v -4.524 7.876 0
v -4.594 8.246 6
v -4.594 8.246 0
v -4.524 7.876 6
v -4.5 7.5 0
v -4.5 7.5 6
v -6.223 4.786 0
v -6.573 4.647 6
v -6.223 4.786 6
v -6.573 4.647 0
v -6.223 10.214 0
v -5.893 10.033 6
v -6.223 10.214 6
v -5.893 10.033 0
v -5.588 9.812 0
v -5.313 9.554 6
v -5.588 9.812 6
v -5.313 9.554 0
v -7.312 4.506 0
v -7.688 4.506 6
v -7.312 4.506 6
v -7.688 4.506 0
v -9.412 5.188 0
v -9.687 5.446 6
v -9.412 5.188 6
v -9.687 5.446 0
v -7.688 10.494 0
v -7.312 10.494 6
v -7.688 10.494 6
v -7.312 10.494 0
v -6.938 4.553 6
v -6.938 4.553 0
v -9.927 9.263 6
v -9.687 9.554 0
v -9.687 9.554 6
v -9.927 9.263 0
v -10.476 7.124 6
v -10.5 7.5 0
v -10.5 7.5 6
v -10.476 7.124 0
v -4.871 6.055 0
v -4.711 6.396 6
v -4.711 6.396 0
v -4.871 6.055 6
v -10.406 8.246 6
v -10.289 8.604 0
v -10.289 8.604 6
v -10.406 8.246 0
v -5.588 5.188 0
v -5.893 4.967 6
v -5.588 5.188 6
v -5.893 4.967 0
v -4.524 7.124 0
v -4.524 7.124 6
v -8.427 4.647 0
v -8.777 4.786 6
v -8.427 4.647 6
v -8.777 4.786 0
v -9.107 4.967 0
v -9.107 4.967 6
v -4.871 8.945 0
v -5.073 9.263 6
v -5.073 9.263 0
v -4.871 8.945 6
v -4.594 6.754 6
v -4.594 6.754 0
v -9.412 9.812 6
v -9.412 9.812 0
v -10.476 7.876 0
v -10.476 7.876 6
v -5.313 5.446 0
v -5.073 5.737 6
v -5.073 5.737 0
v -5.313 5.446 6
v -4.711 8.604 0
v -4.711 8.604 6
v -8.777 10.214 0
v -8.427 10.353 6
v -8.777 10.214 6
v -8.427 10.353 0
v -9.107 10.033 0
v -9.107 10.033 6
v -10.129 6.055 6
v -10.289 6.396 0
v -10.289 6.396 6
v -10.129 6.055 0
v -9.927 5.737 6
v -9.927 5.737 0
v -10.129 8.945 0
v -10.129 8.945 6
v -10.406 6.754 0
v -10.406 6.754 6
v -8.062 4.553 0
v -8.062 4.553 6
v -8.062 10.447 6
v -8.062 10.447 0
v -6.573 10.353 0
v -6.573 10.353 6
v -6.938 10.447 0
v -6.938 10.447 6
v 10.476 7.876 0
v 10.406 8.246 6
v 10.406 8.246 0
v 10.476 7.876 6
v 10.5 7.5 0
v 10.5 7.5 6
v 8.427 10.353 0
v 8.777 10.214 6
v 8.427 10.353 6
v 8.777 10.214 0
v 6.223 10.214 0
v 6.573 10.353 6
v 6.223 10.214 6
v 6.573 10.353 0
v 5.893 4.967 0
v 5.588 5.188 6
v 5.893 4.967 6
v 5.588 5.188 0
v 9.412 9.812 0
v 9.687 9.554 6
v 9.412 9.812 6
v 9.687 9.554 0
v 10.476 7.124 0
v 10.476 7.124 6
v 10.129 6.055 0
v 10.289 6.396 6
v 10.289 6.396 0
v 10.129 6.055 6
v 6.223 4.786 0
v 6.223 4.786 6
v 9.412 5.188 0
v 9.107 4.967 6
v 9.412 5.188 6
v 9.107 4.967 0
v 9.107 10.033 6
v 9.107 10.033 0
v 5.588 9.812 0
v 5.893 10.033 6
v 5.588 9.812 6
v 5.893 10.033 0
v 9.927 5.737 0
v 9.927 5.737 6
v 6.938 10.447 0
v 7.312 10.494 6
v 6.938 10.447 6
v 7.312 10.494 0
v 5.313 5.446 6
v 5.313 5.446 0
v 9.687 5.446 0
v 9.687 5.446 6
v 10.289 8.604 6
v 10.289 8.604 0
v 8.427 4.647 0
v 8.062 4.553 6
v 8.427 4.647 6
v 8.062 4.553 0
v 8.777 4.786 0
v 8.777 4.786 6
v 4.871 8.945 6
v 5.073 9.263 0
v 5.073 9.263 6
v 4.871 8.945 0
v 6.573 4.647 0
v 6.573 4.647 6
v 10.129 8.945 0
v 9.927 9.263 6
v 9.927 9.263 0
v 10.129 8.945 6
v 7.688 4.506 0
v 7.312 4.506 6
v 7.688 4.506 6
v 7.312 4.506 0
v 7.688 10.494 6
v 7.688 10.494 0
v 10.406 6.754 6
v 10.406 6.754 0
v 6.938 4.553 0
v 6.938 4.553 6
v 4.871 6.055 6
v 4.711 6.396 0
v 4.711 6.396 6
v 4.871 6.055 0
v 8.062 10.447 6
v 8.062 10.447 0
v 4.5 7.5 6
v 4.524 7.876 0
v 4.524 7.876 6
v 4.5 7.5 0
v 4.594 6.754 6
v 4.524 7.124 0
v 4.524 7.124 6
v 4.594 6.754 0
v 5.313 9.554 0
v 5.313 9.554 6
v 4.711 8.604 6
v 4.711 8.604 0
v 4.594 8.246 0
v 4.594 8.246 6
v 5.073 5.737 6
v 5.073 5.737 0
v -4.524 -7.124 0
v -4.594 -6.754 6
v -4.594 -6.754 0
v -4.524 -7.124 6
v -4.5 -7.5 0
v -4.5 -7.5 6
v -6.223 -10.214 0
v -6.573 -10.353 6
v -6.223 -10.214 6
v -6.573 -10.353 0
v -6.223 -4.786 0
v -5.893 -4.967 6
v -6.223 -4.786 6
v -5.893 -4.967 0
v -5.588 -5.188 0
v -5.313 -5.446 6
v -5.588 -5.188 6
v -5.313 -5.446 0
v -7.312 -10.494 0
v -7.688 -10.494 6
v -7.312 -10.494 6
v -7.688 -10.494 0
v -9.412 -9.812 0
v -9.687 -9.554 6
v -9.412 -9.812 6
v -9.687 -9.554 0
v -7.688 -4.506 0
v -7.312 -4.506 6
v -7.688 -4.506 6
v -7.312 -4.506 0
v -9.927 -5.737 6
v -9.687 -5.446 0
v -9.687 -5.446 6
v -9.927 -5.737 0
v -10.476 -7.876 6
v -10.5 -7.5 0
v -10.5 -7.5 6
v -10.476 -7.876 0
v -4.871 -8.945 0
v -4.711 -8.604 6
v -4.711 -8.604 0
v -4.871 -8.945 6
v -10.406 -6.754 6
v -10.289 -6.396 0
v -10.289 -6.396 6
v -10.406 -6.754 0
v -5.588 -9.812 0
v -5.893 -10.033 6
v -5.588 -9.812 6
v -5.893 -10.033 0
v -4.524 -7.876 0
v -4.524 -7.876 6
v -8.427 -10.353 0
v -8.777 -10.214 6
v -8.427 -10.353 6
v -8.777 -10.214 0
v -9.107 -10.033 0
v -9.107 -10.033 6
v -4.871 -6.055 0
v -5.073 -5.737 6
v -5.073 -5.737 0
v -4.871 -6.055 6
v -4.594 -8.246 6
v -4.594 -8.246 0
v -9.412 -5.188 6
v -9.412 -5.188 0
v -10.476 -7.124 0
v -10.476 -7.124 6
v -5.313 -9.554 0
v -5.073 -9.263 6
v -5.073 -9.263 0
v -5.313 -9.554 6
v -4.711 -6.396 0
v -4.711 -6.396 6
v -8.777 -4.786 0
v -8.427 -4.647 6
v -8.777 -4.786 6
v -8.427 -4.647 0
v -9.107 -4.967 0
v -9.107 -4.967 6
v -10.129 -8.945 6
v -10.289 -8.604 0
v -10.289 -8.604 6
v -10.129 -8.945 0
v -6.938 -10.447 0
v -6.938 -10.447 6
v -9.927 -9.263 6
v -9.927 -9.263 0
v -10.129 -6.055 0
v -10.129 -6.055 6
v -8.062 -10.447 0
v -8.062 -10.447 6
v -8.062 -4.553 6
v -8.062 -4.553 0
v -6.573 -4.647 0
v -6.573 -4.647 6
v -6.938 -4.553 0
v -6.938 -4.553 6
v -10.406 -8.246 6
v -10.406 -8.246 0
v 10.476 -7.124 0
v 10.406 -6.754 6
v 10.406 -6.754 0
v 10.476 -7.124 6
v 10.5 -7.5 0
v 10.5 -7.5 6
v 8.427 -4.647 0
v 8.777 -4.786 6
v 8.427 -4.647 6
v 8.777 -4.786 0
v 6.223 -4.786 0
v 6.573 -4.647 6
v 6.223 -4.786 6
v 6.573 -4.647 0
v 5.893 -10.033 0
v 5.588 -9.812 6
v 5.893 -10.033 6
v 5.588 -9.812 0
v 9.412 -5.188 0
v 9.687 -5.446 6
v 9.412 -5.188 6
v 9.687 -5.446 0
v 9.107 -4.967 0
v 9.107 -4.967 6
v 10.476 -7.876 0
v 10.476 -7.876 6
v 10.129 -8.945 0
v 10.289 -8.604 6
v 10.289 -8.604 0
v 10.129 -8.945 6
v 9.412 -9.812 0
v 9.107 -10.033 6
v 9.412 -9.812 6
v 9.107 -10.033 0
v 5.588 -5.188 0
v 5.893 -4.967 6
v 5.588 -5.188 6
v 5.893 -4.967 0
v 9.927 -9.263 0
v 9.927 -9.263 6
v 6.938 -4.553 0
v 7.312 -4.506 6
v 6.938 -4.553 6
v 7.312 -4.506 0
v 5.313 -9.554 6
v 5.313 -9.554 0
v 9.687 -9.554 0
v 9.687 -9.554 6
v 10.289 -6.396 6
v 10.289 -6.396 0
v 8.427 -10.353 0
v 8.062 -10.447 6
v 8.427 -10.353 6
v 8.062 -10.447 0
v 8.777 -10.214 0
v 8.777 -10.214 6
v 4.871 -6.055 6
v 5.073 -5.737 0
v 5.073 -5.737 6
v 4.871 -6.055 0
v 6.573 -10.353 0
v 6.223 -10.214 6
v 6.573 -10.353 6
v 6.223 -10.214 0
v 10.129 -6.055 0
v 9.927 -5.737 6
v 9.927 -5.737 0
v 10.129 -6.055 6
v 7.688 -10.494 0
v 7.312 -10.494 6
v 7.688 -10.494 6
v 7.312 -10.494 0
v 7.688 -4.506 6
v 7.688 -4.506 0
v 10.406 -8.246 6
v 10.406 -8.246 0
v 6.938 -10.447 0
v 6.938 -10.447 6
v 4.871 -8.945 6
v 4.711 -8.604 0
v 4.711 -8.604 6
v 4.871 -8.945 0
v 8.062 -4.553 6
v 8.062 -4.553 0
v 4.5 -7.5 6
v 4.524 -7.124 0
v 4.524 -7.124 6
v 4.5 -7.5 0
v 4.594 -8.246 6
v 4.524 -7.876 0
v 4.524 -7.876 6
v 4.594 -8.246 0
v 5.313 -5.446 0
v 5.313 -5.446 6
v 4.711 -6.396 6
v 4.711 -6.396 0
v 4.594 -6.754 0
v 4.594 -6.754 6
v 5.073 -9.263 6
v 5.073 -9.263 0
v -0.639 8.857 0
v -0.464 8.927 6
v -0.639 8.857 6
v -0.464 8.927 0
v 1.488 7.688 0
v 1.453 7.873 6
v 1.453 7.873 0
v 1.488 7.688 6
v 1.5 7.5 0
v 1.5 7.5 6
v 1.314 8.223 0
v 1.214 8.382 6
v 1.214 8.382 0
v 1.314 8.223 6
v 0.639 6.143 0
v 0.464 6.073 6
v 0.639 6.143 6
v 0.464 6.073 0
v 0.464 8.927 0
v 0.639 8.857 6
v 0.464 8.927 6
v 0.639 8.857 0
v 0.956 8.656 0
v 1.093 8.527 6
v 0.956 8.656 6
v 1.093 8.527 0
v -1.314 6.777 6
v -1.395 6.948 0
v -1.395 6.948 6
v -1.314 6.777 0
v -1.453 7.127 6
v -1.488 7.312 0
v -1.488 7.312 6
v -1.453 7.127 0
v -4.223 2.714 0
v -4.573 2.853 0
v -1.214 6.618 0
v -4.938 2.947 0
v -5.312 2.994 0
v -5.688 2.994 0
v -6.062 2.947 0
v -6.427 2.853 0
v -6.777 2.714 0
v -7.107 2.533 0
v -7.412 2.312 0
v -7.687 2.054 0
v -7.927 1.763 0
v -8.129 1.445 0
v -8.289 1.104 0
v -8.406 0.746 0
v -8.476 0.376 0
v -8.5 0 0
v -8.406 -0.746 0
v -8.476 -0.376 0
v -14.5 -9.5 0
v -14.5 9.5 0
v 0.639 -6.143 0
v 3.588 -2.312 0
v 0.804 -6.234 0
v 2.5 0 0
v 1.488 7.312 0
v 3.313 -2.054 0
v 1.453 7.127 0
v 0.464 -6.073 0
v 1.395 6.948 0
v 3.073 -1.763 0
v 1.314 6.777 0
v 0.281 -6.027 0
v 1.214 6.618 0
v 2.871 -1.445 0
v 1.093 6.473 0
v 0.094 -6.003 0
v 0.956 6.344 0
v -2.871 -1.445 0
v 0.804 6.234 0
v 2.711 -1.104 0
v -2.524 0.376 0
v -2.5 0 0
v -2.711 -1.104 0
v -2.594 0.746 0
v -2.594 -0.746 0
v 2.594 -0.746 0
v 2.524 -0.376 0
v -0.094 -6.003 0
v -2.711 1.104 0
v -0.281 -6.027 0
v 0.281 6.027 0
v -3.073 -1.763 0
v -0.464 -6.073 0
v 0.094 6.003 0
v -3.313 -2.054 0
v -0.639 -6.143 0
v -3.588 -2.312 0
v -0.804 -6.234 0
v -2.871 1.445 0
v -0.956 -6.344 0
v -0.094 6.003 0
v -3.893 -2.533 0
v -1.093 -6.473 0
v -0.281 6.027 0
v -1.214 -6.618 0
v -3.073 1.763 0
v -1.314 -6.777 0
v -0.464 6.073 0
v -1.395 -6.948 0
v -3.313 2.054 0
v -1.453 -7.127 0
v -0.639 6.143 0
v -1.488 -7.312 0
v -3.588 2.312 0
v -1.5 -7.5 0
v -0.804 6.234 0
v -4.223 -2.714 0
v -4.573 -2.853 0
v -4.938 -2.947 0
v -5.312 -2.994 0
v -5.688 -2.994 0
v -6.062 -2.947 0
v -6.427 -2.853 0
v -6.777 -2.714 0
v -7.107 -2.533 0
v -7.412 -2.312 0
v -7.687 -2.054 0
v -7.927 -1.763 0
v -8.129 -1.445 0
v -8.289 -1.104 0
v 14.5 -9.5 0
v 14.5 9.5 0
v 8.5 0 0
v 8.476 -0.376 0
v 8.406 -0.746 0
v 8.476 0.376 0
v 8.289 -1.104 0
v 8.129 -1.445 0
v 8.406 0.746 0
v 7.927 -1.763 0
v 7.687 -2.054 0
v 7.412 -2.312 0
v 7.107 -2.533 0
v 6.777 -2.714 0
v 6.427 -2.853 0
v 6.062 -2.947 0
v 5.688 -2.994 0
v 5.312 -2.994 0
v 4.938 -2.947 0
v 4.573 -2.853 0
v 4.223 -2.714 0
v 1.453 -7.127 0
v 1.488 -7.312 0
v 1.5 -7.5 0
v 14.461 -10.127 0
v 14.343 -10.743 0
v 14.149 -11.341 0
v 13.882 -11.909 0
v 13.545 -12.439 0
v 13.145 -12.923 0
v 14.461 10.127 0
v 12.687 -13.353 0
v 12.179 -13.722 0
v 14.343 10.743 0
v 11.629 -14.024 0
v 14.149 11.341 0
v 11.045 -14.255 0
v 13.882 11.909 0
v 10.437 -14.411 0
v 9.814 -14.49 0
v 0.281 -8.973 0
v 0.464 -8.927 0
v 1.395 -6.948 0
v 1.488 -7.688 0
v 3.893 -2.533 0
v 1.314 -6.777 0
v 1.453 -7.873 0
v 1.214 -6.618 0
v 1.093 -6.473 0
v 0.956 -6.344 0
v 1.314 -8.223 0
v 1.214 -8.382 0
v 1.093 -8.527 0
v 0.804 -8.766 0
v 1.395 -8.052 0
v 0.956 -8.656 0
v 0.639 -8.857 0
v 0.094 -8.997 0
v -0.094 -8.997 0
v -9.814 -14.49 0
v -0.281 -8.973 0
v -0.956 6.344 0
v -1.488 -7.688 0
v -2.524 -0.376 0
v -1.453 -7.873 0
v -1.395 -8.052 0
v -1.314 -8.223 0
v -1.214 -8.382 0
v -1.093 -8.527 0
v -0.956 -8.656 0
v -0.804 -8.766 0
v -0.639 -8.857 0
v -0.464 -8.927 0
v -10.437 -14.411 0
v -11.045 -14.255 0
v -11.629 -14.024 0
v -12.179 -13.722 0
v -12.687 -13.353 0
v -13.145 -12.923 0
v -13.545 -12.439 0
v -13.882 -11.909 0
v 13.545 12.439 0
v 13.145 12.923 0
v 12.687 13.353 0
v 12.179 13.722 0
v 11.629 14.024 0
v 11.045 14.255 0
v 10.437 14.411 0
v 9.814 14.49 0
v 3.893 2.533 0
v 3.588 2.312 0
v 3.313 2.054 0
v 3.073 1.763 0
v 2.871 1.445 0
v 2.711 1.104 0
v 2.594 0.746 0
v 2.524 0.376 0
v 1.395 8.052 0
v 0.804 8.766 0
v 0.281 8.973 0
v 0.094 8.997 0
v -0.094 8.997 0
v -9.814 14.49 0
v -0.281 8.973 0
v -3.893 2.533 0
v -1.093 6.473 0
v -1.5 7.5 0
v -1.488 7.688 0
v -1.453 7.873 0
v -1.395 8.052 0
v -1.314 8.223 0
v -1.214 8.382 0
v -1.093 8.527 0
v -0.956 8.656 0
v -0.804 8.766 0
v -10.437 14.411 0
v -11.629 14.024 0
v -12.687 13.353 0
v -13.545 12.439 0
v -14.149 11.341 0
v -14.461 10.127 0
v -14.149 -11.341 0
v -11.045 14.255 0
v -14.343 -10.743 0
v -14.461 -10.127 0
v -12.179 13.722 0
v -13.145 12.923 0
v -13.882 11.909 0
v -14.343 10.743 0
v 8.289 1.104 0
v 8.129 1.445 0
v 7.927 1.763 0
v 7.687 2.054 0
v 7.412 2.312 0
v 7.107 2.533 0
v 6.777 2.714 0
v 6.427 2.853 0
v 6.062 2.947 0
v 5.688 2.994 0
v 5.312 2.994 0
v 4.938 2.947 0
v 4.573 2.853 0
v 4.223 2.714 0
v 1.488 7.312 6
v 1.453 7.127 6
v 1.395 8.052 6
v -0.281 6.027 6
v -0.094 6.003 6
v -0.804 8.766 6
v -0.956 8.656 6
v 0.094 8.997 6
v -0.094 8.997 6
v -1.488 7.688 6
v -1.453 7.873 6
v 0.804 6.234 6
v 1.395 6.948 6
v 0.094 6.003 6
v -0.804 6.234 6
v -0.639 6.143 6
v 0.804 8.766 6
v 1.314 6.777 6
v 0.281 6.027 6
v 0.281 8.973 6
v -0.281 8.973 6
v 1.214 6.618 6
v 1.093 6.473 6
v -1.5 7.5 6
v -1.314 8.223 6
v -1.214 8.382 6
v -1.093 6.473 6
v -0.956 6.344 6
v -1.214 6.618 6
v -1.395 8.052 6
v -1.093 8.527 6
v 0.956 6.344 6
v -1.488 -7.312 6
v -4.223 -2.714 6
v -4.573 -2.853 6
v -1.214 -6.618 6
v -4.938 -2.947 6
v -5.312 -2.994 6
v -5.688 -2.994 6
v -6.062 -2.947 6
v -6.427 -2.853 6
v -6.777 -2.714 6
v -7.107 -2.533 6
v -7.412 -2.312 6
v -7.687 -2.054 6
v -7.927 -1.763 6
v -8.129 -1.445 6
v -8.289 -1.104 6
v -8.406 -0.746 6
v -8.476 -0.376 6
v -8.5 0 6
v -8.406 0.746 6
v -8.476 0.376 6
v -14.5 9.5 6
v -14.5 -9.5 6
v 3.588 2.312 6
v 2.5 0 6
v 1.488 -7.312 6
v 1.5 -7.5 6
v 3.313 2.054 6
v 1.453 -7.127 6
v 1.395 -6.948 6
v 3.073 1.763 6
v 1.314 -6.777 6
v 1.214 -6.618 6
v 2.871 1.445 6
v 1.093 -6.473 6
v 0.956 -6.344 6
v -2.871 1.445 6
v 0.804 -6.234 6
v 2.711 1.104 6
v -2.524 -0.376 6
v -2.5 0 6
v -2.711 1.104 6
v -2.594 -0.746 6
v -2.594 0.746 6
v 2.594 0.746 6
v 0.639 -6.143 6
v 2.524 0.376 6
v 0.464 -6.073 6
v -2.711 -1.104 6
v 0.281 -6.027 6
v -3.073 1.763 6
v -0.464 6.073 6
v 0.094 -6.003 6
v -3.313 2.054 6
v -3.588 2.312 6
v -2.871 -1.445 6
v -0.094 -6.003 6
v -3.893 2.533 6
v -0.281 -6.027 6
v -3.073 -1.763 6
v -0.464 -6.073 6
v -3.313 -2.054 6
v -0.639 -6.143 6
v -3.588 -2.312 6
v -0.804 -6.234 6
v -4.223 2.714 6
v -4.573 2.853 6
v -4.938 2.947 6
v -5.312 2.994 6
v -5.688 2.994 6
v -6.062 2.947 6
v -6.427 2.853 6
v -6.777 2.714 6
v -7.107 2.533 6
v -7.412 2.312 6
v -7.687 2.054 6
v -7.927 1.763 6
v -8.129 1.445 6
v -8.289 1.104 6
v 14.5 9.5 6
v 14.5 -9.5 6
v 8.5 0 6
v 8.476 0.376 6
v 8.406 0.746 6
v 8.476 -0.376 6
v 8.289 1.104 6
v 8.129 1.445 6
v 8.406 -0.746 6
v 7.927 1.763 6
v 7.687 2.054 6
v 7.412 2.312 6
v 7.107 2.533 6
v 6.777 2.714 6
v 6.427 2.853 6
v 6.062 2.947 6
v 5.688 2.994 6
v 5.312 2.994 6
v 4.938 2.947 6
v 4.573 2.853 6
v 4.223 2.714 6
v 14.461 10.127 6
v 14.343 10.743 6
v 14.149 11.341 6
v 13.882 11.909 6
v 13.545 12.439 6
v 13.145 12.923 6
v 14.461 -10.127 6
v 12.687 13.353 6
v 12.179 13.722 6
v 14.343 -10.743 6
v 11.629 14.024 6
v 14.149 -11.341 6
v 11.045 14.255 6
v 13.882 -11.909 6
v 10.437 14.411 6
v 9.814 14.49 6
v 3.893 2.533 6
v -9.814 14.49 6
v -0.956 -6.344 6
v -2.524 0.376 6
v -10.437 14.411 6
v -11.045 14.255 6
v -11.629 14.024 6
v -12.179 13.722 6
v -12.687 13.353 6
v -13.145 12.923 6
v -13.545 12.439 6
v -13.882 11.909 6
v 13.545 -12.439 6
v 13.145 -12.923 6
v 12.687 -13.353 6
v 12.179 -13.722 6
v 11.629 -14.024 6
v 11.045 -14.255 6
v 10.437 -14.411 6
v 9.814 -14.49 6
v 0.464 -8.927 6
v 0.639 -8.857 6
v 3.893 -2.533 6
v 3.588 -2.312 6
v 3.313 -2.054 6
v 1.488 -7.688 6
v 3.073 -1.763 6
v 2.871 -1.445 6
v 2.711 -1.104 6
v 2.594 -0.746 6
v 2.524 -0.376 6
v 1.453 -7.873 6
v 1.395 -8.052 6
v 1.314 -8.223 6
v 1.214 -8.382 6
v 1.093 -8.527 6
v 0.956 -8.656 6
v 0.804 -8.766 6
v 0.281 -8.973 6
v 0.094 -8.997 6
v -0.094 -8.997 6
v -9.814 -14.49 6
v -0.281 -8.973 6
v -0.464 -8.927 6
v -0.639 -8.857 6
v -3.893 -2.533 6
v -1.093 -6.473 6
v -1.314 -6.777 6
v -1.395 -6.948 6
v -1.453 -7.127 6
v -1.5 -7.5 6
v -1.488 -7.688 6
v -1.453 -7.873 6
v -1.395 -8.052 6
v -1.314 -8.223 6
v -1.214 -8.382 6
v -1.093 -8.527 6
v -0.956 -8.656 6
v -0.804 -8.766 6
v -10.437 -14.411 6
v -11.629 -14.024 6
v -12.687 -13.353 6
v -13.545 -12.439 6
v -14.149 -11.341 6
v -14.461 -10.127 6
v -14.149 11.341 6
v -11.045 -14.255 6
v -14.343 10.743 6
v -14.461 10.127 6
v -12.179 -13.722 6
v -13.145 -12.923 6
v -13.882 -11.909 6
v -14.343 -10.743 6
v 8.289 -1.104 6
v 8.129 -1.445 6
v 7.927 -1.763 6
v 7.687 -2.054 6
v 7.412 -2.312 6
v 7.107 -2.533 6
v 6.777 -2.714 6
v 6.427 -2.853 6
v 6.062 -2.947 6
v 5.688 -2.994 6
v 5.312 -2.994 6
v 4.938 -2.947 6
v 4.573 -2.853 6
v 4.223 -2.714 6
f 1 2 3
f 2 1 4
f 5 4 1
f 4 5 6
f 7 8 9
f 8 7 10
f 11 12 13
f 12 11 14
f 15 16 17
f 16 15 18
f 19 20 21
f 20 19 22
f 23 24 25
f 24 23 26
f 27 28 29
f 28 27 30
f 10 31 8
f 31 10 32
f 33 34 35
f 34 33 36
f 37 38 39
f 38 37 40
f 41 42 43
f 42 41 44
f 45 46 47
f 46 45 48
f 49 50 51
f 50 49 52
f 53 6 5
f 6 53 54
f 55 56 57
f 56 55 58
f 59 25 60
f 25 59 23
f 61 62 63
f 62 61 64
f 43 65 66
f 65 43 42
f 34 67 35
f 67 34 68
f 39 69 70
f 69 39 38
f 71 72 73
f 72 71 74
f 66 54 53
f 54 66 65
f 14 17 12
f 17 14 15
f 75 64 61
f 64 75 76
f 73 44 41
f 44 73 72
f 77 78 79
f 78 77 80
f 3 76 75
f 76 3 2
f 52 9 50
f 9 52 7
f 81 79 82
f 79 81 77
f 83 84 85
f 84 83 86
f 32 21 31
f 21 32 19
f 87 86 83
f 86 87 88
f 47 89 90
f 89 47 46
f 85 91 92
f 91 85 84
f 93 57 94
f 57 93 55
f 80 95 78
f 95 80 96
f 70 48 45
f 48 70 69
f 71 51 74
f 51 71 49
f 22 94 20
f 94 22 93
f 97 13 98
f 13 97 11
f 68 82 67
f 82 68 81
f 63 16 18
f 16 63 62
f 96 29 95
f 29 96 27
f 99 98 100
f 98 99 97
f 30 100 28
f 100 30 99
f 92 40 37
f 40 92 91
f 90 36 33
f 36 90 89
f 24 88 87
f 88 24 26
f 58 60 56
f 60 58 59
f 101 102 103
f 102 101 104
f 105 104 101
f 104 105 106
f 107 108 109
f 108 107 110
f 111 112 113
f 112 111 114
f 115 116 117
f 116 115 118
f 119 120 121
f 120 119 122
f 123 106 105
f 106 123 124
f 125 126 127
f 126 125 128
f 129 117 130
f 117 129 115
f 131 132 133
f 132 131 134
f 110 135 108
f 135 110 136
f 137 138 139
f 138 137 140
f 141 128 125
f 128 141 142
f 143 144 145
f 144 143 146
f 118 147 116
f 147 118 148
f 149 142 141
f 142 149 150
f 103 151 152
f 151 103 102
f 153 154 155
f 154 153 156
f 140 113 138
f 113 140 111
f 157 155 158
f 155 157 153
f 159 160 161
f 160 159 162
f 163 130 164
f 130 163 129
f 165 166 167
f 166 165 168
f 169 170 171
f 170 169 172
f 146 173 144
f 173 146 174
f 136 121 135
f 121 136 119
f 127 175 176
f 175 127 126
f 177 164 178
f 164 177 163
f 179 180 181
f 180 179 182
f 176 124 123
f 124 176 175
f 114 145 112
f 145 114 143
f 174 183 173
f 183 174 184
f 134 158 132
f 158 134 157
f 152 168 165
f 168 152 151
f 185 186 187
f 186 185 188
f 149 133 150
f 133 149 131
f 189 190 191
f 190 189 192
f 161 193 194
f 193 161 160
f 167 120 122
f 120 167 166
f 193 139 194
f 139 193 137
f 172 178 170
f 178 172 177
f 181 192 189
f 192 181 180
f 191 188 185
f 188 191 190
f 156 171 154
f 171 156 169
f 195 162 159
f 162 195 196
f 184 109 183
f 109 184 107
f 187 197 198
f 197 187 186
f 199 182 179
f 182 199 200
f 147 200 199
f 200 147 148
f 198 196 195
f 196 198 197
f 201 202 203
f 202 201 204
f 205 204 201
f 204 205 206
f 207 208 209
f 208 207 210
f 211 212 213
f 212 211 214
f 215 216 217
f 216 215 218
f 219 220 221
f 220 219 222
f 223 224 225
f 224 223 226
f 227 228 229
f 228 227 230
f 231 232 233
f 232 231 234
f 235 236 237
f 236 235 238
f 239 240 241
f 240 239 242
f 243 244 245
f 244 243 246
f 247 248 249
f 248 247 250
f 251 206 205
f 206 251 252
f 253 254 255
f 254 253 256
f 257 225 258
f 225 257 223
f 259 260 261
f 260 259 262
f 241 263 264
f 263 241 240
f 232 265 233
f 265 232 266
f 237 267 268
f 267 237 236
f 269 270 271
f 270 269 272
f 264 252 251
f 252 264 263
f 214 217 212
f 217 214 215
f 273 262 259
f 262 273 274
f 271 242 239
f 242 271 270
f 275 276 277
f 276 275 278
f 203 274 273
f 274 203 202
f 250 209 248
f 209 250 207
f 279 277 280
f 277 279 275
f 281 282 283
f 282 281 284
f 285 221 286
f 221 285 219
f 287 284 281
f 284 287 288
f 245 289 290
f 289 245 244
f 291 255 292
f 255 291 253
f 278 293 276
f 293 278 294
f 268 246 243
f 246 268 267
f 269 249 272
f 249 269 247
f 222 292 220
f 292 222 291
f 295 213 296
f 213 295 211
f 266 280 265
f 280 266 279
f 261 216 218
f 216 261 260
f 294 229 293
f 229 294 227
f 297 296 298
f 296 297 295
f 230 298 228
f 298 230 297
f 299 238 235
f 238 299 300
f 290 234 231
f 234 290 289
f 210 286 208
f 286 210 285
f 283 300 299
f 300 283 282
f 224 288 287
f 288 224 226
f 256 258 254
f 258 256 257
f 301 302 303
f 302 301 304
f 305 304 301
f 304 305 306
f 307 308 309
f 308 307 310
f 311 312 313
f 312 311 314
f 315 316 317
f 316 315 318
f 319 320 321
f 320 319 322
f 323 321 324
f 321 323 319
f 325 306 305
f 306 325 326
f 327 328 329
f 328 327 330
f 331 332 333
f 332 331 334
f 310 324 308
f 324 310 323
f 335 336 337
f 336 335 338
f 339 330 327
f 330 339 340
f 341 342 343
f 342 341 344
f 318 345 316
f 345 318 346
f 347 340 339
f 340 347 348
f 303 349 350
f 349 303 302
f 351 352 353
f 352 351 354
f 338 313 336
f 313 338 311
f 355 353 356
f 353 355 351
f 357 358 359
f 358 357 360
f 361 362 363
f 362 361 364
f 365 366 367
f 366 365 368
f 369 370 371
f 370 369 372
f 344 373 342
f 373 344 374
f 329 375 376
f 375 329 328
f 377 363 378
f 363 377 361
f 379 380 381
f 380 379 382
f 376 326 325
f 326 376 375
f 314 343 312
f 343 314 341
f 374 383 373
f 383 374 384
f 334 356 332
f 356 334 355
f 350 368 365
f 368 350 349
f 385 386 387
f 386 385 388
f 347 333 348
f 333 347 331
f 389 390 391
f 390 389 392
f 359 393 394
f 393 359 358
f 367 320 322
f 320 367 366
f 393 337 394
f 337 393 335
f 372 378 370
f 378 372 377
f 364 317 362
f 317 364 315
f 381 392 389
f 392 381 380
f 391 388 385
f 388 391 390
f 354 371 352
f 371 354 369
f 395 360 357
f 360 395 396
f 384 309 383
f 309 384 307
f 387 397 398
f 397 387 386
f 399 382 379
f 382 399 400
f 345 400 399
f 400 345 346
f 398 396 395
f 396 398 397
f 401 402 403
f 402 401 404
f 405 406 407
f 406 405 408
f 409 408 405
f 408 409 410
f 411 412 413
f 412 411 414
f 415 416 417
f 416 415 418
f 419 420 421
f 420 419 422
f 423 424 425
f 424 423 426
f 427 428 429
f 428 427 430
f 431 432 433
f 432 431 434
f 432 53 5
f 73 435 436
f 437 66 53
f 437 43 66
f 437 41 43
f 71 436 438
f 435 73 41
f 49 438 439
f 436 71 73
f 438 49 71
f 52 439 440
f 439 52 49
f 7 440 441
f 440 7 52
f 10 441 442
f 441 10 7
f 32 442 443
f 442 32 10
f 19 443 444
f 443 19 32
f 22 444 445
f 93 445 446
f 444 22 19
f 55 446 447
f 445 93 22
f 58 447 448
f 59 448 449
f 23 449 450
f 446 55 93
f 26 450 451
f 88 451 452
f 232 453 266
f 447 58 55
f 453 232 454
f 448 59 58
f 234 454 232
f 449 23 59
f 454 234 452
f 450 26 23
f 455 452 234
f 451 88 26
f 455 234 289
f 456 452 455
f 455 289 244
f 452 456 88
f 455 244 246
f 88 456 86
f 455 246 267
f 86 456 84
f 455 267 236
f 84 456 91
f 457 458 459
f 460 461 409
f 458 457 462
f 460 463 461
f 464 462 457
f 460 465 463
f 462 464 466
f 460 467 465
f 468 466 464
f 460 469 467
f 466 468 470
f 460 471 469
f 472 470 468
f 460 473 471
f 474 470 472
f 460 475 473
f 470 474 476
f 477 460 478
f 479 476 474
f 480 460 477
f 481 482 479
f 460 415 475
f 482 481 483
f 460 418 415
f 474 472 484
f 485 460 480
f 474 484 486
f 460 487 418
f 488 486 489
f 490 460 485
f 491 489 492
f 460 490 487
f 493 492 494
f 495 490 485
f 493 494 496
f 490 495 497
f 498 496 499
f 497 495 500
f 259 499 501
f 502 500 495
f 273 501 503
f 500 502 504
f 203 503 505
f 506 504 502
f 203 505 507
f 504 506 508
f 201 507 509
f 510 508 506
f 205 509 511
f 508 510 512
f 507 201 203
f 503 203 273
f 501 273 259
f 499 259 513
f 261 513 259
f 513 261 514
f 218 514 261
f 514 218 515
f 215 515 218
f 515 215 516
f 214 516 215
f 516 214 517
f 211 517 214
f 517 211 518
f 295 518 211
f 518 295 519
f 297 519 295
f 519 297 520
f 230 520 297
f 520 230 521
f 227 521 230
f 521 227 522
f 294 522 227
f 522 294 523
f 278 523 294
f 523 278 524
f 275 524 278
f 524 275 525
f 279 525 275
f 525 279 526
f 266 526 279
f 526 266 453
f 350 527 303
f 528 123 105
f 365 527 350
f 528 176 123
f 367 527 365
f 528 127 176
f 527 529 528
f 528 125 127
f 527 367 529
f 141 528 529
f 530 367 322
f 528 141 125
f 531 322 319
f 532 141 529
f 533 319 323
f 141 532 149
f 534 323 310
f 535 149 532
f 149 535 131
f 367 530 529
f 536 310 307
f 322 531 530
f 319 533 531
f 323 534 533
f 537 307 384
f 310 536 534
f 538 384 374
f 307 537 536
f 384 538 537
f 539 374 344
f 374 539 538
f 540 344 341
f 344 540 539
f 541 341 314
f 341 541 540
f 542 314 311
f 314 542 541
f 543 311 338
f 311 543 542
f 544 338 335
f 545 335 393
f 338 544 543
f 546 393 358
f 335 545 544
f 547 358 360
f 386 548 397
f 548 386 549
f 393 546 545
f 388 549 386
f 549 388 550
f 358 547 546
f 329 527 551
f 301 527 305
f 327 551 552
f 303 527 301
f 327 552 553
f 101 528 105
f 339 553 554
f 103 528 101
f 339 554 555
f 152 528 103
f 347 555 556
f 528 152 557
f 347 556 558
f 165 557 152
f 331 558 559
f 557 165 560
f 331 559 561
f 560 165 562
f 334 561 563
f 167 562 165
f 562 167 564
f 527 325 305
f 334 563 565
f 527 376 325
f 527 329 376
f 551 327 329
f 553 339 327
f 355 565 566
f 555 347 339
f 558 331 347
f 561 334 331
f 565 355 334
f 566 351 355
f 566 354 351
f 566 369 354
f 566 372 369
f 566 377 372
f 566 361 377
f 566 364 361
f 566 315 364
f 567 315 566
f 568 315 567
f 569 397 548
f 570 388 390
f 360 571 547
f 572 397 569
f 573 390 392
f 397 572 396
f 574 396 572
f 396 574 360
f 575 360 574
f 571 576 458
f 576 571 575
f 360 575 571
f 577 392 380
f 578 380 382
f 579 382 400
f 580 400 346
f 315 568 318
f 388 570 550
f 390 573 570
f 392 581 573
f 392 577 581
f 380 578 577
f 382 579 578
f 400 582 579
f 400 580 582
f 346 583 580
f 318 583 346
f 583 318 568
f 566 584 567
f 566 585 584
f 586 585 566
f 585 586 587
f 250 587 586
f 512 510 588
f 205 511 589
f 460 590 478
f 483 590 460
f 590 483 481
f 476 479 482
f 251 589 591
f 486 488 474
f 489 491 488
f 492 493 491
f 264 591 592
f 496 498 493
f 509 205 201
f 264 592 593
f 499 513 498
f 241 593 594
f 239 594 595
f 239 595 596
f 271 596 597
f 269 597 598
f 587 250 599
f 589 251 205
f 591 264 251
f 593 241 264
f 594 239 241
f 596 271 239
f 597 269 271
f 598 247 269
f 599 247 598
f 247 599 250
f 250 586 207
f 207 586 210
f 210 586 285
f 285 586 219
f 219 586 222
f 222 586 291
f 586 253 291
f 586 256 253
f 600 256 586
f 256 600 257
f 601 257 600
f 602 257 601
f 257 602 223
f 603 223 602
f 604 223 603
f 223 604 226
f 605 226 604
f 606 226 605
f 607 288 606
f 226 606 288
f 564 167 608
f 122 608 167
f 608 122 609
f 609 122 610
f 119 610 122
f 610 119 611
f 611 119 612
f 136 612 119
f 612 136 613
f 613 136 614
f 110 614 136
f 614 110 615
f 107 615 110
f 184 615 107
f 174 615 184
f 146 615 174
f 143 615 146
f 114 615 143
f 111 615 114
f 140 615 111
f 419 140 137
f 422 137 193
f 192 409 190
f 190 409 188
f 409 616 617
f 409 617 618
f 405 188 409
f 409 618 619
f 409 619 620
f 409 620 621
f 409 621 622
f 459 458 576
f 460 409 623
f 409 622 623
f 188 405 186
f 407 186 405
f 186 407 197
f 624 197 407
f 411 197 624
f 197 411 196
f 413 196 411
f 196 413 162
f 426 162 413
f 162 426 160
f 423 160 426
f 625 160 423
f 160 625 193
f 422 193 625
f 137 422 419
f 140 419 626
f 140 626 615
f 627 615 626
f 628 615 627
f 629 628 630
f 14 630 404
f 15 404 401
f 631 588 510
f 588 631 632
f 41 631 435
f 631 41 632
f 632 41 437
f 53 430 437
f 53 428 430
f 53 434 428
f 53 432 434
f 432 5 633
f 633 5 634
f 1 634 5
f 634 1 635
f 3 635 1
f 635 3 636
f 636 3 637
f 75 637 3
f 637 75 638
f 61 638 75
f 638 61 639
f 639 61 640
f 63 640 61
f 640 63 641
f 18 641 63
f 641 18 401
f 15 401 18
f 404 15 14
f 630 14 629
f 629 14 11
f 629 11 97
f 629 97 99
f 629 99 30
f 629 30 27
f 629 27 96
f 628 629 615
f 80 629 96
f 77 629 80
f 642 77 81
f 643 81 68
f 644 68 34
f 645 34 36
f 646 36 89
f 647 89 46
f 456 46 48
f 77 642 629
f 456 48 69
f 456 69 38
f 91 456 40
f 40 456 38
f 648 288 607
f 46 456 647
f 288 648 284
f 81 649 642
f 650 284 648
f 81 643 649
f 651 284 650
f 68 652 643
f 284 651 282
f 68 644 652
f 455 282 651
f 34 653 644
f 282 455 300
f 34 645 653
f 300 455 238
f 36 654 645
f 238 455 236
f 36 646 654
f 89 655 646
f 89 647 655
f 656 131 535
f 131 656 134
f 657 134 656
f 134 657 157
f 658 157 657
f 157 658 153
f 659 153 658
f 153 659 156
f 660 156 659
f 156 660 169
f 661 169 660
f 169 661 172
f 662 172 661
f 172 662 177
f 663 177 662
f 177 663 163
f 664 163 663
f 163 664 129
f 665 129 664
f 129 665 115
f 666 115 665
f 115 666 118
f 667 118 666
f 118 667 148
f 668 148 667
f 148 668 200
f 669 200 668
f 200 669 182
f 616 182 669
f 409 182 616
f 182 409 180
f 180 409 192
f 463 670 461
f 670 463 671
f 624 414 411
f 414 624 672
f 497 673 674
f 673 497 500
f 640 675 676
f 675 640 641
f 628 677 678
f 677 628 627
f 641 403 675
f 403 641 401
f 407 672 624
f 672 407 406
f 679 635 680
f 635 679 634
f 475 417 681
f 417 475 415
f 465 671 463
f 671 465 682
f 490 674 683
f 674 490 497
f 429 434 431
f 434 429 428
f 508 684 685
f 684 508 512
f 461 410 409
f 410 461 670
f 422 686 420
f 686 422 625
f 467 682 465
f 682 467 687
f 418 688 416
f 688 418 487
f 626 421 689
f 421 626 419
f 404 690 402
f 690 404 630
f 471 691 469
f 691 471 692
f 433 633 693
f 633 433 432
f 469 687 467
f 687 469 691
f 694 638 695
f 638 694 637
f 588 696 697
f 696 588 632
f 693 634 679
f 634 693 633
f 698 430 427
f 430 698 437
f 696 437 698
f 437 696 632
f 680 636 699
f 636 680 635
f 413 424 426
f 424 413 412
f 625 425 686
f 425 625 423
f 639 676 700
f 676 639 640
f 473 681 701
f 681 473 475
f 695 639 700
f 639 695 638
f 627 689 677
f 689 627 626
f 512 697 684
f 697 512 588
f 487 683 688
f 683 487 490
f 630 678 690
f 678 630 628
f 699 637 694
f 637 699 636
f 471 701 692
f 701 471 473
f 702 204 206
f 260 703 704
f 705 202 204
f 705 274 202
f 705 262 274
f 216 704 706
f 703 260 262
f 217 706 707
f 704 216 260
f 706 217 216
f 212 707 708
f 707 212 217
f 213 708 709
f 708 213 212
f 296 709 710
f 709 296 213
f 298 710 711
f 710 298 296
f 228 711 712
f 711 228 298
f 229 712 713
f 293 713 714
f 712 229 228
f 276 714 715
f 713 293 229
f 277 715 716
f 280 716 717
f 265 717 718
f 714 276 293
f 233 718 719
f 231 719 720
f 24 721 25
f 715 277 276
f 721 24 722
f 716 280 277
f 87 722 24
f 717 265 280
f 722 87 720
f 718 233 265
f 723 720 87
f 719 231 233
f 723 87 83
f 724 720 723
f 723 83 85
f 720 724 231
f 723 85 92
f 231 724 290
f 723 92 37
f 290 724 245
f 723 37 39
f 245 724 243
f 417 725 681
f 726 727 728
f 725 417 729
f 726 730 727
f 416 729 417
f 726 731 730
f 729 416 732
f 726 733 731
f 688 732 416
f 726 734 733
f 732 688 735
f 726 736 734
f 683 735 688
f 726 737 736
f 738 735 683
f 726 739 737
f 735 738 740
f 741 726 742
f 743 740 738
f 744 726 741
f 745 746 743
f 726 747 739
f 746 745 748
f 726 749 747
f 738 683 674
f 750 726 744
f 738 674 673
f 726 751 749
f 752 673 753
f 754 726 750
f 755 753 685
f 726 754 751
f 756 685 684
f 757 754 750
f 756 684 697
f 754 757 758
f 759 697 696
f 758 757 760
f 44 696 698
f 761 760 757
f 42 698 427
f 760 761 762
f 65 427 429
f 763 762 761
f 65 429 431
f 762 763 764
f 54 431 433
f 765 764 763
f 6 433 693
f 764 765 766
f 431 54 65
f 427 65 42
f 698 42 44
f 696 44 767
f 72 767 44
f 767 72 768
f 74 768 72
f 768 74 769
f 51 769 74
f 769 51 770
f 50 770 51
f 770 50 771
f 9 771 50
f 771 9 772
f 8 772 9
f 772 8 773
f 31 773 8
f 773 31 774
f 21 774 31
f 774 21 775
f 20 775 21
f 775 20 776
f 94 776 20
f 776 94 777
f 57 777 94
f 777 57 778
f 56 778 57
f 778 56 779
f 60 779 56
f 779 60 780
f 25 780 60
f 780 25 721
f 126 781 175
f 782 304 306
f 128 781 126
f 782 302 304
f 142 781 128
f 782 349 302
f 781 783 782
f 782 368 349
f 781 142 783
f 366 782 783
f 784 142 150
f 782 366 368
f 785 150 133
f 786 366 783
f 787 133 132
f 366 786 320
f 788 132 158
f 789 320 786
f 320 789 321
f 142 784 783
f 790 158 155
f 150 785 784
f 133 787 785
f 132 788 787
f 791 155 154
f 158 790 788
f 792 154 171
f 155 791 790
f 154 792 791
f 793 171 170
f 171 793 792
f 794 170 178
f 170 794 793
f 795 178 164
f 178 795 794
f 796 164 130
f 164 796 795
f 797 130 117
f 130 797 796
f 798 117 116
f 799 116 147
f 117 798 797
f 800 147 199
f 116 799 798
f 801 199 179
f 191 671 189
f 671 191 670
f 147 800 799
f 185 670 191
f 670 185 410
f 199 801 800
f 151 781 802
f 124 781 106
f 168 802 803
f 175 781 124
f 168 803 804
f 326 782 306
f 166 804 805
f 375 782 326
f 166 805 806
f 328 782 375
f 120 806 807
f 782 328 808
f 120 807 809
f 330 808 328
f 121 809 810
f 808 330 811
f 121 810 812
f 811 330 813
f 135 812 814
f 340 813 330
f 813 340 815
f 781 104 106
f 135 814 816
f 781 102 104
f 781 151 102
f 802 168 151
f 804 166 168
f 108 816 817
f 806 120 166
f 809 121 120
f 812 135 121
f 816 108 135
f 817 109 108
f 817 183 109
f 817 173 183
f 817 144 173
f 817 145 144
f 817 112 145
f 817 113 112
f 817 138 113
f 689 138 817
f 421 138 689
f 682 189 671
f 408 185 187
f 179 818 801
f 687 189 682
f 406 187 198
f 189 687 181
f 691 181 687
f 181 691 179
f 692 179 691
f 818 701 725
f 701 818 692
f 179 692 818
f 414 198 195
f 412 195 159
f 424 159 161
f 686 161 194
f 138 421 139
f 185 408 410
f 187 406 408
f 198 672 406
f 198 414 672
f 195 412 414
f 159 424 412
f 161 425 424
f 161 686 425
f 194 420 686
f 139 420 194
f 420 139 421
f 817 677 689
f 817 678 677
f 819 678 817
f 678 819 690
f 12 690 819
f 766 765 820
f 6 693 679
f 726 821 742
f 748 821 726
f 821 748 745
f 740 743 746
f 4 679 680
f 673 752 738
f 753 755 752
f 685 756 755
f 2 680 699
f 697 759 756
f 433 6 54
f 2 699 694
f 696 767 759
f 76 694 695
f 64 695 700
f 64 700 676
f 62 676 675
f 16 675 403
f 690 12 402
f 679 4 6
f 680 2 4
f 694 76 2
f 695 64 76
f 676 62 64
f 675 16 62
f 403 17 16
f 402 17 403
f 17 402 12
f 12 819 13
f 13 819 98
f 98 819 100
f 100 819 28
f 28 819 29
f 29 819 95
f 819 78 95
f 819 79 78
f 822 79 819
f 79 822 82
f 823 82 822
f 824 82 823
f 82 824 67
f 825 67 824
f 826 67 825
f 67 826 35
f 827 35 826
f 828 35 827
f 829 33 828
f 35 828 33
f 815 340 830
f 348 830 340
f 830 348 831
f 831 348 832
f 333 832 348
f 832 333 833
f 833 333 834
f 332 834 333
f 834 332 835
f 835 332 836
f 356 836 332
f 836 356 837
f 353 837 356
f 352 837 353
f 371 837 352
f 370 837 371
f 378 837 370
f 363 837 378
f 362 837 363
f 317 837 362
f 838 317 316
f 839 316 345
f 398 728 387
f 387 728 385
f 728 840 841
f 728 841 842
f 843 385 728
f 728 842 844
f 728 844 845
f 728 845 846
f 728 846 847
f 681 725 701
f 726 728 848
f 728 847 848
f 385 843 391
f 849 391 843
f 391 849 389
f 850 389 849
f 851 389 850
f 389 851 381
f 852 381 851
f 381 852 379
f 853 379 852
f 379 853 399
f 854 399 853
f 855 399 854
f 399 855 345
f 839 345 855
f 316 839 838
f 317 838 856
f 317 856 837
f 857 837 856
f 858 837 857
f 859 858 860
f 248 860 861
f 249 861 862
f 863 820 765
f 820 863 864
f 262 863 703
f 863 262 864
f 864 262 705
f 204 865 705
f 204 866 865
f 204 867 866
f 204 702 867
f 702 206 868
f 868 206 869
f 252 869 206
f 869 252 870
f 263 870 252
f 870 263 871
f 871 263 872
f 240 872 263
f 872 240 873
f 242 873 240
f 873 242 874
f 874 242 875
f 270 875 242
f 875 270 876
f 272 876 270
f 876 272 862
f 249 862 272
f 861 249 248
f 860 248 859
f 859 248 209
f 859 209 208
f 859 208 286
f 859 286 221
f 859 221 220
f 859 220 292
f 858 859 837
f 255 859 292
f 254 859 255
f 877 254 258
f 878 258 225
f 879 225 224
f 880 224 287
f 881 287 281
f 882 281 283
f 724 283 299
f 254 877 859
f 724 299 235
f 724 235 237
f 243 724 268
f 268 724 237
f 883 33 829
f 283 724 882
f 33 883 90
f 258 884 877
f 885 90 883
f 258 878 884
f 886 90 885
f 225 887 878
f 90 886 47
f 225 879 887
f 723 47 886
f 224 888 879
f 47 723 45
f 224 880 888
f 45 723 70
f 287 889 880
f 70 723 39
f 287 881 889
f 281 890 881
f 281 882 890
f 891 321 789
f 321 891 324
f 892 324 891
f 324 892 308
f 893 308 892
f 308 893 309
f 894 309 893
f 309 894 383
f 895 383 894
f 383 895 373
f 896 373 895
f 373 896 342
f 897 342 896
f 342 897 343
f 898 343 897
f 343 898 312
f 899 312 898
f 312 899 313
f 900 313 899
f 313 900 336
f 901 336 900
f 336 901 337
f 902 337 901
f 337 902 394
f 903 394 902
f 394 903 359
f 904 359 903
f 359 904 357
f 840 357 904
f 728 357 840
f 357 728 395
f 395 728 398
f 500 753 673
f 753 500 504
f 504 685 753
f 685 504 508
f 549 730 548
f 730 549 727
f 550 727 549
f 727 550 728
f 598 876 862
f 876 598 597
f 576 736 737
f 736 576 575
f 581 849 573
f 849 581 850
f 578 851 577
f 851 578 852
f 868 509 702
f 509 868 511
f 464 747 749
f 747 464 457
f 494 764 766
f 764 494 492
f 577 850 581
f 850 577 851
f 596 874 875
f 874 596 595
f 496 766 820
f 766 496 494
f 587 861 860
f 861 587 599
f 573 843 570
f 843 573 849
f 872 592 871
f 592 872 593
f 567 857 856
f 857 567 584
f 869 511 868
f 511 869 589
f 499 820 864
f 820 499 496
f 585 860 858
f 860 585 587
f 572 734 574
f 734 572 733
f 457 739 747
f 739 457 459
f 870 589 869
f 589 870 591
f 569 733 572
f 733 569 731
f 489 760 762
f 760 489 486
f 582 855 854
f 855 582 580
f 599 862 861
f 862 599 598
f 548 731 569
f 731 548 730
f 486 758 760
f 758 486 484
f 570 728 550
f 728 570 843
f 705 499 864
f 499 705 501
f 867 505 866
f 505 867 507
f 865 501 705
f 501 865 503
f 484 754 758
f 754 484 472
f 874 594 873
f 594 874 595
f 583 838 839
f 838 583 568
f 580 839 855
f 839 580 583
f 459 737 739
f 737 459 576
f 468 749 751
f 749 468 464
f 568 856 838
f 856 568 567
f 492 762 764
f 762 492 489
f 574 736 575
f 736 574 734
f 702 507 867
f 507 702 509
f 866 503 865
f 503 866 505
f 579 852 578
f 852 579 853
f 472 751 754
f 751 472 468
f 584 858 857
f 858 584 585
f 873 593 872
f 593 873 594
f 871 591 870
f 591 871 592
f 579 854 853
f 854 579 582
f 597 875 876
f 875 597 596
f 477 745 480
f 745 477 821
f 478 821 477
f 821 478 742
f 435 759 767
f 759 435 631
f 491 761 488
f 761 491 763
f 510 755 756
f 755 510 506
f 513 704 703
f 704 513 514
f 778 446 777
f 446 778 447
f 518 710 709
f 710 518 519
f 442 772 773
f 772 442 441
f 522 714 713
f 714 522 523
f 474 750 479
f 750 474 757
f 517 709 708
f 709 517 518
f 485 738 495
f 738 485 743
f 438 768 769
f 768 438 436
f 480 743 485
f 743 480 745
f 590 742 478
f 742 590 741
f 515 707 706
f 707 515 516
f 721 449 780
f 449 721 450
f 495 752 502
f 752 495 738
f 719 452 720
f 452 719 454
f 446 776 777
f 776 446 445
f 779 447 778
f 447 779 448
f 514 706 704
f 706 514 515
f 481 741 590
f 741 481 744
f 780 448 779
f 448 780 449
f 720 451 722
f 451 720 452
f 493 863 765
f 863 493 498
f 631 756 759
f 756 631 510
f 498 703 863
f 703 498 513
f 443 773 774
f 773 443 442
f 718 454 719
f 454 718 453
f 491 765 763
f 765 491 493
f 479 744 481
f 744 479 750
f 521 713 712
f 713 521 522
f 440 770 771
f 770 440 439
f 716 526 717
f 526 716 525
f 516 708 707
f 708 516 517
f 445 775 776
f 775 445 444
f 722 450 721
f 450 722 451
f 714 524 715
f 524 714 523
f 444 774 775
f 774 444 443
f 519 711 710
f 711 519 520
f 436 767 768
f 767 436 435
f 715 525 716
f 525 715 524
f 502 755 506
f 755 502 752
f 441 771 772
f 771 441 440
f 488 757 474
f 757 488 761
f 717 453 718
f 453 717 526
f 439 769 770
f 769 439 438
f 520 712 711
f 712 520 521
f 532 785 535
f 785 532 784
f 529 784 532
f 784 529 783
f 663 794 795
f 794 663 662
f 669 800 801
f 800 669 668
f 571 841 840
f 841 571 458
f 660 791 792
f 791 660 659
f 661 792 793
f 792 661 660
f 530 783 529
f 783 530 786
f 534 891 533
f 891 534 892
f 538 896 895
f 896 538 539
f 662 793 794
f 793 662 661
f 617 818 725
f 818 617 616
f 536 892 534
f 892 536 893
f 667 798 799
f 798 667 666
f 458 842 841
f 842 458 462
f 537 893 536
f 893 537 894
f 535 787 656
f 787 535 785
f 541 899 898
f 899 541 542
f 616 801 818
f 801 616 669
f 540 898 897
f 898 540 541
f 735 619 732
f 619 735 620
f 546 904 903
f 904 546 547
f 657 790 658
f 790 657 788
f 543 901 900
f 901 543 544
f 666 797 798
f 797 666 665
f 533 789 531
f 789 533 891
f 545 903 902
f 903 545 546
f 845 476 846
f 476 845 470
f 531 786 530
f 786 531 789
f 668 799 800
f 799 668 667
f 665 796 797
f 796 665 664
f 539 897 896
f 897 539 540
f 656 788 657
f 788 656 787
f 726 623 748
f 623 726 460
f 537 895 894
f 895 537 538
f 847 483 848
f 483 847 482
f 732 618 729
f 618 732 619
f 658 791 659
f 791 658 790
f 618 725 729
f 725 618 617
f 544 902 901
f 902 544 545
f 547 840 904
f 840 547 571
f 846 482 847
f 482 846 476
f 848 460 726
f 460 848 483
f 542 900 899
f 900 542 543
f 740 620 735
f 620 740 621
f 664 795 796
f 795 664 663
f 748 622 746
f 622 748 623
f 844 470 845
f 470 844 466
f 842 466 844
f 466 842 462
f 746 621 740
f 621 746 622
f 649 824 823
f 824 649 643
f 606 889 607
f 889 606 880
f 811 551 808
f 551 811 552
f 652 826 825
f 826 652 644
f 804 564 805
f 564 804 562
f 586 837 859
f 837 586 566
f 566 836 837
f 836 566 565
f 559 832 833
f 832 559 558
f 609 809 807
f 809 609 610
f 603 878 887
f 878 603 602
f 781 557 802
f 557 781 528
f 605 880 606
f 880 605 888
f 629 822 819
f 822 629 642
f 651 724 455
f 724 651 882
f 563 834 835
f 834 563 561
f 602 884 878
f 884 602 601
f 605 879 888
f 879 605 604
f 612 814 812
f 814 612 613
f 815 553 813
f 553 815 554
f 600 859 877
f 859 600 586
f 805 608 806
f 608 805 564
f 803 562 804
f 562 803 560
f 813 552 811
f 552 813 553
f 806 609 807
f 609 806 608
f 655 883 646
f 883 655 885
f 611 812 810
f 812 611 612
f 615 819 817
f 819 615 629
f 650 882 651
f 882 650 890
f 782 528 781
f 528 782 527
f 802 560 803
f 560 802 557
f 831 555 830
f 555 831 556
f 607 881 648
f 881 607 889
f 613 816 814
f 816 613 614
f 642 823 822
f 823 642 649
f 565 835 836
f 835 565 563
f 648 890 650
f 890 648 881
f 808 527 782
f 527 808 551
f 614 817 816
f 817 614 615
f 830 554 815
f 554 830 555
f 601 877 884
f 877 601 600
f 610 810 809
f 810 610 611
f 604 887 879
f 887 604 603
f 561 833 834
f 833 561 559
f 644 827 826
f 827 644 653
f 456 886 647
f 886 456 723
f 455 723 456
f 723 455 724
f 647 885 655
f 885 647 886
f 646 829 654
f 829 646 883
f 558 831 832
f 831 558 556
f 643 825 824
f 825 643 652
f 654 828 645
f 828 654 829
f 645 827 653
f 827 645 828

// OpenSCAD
$fn = 50;


difference() {
	union() {
		hull() {
			translate(v = [-9.5000000000, 9.5000000000, 0]) {
				cylinder(h = 6, r = 5);
			}
			translate(v = [9.5000000000, 9.5000000000, 0]) {
				cylinder(h = 6, r = 5);
			}
			translate(v = [-9.5000000000, -9.5000000000, 0]) {
				cylinder(h = 6, r = 5);
			}
			translate(v = [9.5000000000, -9.5000000000, 0]) {
				cylinder(h = 6, r = 5);
			}
		}
	}
	union() {
		#translate(v = [-7.5000000000, 7.5000000000, 0]) {
			cylinder(h = 6, r = 3.0000000000);
		}
		#translate(v = [7.5000000000, 7.5000000000, 0]) {
			cylinder(h = 6, r = 3.0000000000);
		}
		#translate(v = [-7.5000000000, -7.5000000000, 0]) {
			cylinder(h = 6, r = 3.0000000000);
		}
		#translate(v = [7.5000000000, -7.5000000000, 0]) {
			cylinder(h = 6, r = 3.0000000000);
		}
		#translate(v = [-7.5000000000, -7.5000000000, -100.0000000000]) {
			cylinder(h = 200, r = 3.0000000000);
		}
		#translate(v = [-7.5000000000, 7.5000000000, -100.0000000000]) {
			cylinder(h = 200, r = 3.0000000000);
		}
		#translate(v = [7.5000000000, -7.5000000000, -100.0000000000]) {
			cylinder(h = 200, r = 3.0000000000);
		}
		#translate(v = [7.5000000000, 7.5000000000, -100.0000000000]) {
			cylinder(h = 200, r = 3.0000000000);
		}
		#translate(v = [-7.5000000000, 7.5000000000, 0]) {
			cylinder(h = 6, r = 1.5000000000);
		}
		#translate(v = [0.0000000000, 7.5000000000, 0]) {
			cylinder(h = 6, r = 1.5000000000);
		}
		#translate(v = [7.5000000000, 7.5000000000, 0]) {
			cylinder(h = 6, r = 1.5000000000);
		}
		#translate(v = [-7.5000000000, -7.5000000000, 0]) {
			cylinder(h = 6, r = 1.5000000000);
		}
		#translate(v = [0.0000000000, -7.5000000000, 0]) {
			cylinder(h = 6, r = 1.5000000000);
		}
		#translate(v = [7.5000000000, -7.5000000000, 0]) {
			cylinder(h = 6, r = 1.5000000000);
		}
		#translate(v = [-7.5000000000, 7.5000000000, 0]) {
			cylinder(h = 6, r = 1.5000000000);
		}
		#translate(v = [0.0000000000, 7.5000000000, 0]) {
			cylinder(h = 6, r = 1.5000000000);
		}
		#translate(v = [7.5000000000, 7.5000000000, 0]) {
			cylinder(h = 6, r = 1.5000000000);
		}
		#translate(v = [-7.5000000000, -7.5000000000, 0]) {
			cylinder(h = 6, r = 1.5000000000);
		}
		#translate(v = [0.0000000000, -7.5000000000, 0]) {
			cylinder(h = 6, r = 1.5000000000);
		}
		#translate(v = [7.5000000000, -7.5000000000, 0]) {
			cylinder(h = 6, r = 1.5000000000);
		}
		#translate(v = [-7.5000000000, 7.5000000000, 0]) {
			cylinder(h = 6, r = 1.5000000000);
		}
		#translate(v = [0.0000000000, 7.5000000000, 0]) {
			cylinder(h = 6, r = 1.5000000000);
		}
		#translate(v = [7.5000000000, 7.5000000000, 0]) {
			cylinder(h = 6, r = 1.5000000000);
		}
		#translate(v = [-7.5000000000, -7.5000000000, 0]) {
			cylinder(h = 6, r = 1.5000000000);
		}
		#translate(v = [0.0000000000, -7.5000000000, 0]) {
			cylinder(h = 6, r = 1.5000000000);
		}
		#translate(v = [7.5000000000, -7.5000000000, 0]) {
			cylinder(h = 6, r = 1.5000000000);
		}
		#translate(v = [-5.5000000000, 0, 0]) {
			cylinder(h = 6, r = 3.0000000000);
		}
		#translate(v = [5.5000000000, 0, 0]) {
			cylinder(h = 6, r = 3.0000000000);
		}
	}
}
